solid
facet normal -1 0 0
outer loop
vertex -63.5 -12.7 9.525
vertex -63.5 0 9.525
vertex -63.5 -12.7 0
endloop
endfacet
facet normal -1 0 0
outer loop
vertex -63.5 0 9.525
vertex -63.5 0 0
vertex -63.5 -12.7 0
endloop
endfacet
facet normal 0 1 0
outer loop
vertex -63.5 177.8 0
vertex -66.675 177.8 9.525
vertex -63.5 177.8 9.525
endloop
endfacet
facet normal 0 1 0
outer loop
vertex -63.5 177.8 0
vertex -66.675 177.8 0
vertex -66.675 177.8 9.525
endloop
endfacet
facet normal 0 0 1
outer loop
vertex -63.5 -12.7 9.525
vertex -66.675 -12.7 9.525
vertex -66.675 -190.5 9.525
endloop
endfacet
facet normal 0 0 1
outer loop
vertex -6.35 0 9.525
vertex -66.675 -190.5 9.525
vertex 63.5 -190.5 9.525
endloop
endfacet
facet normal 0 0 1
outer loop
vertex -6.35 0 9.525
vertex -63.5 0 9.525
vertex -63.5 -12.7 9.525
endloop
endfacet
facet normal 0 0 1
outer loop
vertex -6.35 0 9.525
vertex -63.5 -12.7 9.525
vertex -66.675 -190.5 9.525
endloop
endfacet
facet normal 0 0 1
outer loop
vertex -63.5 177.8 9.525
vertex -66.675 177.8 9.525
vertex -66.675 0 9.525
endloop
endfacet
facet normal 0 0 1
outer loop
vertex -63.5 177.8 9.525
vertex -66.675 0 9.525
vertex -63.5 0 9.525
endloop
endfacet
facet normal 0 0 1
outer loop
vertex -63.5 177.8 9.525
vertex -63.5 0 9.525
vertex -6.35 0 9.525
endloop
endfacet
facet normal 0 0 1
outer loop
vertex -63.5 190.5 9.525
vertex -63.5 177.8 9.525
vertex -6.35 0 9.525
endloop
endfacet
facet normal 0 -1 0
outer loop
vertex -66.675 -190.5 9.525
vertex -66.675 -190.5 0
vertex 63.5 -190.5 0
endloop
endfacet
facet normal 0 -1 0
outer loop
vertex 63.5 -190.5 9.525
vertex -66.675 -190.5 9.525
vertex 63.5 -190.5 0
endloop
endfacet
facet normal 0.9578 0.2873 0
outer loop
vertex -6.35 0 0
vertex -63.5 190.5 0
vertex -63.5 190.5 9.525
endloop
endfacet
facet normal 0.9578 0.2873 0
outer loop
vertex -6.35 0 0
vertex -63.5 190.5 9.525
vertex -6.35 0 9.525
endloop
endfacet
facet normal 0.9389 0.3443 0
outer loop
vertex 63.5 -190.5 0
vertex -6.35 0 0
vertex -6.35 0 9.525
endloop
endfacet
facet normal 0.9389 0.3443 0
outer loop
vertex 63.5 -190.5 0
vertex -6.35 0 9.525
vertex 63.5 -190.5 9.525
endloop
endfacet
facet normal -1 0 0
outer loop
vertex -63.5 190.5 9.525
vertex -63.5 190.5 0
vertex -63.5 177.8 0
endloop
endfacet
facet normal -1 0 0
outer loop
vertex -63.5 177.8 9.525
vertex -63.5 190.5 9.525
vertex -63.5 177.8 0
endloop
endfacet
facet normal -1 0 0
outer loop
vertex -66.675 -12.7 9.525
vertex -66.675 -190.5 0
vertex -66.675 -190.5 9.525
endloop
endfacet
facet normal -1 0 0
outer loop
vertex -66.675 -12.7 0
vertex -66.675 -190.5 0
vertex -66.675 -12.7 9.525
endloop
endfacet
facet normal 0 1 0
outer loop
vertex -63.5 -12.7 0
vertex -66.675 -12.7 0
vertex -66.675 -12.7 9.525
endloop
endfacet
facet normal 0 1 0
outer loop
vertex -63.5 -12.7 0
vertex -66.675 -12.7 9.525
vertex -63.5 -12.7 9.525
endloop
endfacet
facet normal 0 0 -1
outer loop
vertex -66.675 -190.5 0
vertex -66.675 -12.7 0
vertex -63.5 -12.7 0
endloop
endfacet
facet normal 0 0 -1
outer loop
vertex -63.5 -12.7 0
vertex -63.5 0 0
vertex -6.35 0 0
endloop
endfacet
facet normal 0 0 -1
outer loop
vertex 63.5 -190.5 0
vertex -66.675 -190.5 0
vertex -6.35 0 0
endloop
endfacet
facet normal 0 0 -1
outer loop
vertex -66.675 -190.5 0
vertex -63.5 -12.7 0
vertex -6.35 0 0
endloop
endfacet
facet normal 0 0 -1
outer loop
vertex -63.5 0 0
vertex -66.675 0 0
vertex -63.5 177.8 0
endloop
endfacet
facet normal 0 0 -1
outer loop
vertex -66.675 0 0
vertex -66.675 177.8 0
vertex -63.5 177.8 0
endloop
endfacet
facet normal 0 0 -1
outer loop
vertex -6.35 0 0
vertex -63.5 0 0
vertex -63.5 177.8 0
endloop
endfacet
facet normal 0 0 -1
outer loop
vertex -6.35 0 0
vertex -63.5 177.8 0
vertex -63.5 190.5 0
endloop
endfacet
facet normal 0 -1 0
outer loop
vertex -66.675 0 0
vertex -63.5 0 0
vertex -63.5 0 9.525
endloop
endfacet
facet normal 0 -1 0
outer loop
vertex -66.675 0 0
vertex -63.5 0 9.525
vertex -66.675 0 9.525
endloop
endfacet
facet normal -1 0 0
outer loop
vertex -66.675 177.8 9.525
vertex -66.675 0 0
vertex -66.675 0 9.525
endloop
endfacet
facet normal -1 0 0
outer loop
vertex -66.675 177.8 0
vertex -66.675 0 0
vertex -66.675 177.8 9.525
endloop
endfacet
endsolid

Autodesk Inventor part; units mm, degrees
ref_plane "YZ Plane" through (0, 0, 0) normal (1, 0, 0) x (0, 1, 0)
ref_plane "XZ Plane" through (0, 0, 0) normal (0, 1, 0) x (-1, 0, 0)
ref_plane "XY Plane" through (0, 0, 0) normal (0, 0, 1) x (1, 0, 0)
sketch "Sketch1" plane through (0, 0, 0) normal (0, 0, 1) x (1, 0, 0)
  line L0 (-63.5, -190.5) -> (63.5, -190.5)
  line L1 (63.5, -190.5) -> (63.5, 190.5) construction
  line L2 (63.5, 190.5) -> (-63.5, 190.5) construction
  line L3 (-63.5, 190.5) -> (-63.5, -190.5)
  line L4 (-63.5, -190.5) -> (63.5, 190.5) construction
  line L5 (63.5, -190.5) -> (-63.5, 190.5) construction
  line L6 (-63.5, 190.5) -> (-6.35, 0)
  line L7 (-6.35, 0) -> (63.5, -190.5)
  line L8 (-63.5, -190.5) -> (-66.675, -190.5)
  line L9 (-66.675, -190.5) -> (-66.675, -12.7)
  line L10 (-66.675, -12.7) -> (-63.5, -12.7)
  line L11 (-63.5, -12.7) -> (-63.5, -190.5)
  line L12 (-63.5, 0) -> (-66.675, 0)
  line L13 (-66.675, 0) -> (-66.675, 177.8)
  line L14 (-66.675, 177.8) -> (-63.5, 177.8)
  line L15 (-63.5, 177.8) -> (-63.5, 0)
  point P0 (0, 0)
  dimension "d0" = 381
  dimension "d1" = 127
  dimension "d2" = 190.5
  dimension "d3" = 57.15
  dimension "d7" = 3.175
  dimension "d8" = 177.8
  dimension "d9" = 3.175
  dimension "d10" = 12.7
  dimension "d11" = 12.7
extrude "Extrusion1" add sketch "Sketch1" along normal blind 9.525
equation "\"d2\" = 0.5 * d0"
properties part number "Fin"
